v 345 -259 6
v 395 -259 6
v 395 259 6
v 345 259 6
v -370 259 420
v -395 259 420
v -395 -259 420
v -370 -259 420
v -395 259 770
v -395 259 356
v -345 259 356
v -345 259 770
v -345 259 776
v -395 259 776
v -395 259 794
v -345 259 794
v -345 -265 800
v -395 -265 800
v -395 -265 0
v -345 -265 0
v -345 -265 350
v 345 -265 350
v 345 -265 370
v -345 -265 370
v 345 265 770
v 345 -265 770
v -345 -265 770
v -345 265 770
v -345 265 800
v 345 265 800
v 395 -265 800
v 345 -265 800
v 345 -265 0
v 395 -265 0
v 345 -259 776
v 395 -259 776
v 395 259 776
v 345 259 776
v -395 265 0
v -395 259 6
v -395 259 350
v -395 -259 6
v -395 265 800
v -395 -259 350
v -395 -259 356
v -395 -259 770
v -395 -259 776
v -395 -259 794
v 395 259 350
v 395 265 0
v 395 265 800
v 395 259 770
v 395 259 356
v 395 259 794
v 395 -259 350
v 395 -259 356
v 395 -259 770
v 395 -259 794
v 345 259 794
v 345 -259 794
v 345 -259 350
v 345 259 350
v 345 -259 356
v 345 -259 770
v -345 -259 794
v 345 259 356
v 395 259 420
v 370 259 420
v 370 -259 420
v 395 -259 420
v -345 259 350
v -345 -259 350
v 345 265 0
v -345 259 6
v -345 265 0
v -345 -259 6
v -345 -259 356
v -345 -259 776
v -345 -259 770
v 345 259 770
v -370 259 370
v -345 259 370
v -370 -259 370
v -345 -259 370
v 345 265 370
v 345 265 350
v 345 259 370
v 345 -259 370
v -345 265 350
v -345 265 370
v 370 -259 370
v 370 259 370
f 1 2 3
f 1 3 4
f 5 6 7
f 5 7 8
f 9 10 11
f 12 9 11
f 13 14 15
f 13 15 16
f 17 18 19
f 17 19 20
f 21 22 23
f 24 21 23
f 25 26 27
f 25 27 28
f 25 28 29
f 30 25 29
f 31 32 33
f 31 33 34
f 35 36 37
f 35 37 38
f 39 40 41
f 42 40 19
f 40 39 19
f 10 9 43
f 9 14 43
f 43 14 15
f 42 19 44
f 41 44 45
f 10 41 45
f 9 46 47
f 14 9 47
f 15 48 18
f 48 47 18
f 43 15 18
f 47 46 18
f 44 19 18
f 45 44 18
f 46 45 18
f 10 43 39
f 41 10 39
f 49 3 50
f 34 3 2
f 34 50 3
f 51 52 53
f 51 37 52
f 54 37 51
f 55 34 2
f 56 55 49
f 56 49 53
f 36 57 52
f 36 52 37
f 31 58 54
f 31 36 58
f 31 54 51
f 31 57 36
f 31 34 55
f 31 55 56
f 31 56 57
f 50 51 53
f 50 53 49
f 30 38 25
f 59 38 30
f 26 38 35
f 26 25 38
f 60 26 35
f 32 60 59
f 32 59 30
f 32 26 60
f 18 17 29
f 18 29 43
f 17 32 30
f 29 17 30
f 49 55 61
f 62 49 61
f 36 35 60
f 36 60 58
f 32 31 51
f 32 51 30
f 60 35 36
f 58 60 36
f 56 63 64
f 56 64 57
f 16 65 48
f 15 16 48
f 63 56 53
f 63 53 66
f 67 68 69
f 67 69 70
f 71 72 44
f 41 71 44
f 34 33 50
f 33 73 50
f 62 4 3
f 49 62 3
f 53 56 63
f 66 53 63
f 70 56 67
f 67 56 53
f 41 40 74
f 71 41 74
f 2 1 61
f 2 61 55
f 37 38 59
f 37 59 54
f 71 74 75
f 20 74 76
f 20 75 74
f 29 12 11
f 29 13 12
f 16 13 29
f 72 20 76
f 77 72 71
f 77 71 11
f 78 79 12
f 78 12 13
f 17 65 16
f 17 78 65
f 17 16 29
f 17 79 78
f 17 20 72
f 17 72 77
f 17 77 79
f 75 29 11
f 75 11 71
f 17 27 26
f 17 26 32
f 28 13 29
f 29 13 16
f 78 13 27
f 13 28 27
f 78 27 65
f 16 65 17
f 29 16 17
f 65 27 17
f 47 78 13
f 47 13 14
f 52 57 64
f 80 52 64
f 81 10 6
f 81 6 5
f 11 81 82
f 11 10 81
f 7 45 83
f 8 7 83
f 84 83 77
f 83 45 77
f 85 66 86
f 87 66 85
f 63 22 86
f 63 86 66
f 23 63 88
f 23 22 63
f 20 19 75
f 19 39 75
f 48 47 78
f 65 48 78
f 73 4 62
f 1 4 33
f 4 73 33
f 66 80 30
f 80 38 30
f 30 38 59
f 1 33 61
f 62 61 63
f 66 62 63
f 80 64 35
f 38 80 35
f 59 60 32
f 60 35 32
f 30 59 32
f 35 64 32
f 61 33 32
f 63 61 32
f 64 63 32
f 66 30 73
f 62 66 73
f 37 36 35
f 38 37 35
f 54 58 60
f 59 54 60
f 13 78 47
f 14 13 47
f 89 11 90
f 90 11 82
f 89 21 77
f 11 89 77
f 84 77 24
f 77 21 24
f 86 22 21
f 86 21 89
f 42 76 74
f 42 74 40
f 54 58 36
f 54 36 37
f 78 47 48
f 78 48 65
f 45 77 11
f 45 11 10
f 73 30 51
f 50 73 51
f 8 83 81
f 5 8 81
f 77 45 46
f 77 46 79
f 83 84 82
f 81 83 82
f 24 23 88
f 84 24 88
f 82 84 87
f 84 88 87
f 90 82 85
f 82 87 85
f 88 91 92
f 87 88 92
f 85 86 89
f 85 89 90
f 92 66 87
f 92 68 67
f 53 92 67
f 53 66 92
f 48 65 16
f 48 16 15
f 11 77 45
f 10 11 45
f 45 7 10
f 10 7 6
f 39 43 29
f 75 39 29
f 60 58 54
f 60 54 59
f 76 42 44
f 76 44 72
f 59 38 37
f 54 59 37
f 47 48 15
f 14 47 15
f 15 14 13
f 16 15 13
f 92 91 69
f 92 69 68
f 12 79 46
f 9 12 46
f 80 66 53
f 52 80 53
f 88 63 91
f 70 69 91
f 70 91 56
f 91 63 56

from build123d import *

# Parameters (mm, degrees)
F2_W           = 50
F2_H           = 6
F3_DEPTH       = 800
F4_W           = 50
F4_H           = 6
F5_DEPTH       = 518
F10_W          = 530
F10_H          = 30
F11_DEPTH      = 395
F11_DEPTH_BACK = 395
F10_H_2        = 20
F14_W          = 25
F14_H          = 530
F15_DEPTH      = 50


with BuildPart() as f3:
    # F2 (on Top) → F3 (new body)
    with BuildSketch(Plane.XY):
        with Locations((-370, -262)):
            Rectangle(F2_W, F2_H)
    extrude(amount=F3_DEPTH)



with BuildPart() as f3b:
    # F2 (on Top) → F3, piece 2 (new body)
    with BuildSketch(Plane.XY):
        with Locations((-370, 262)):
            Rectangle(F2_W, F2_H)
    extrude(amount=F3_DEPTH)


with BuildPart() as f3c:
    # F2 (on Top) → F3, piece 3 (new body)
    with BuildSketch(Plane.XY):
        with Locations((370, -262)):
            Rectangle(F2_W, F2_H)
    extrude(amount=F3_DEPTH)



with BuildPart() as f3d:
    # F2 (on Top) → F3, piece 4 (new body)
    with BuildSketch(Plane.XY):
        with Locations((370, 262)):
            Rectangle(F2_W, F2_H)
    extrude(amount=F3_DEPTH)


with BuildPart() as f3c_1:
    add(f3c.part)

    add(f3d.part)  # F5 merges F3d
    # F4 (on face) → F5 (join, through all)
    with BuildSketch(Plane(origin=(0, -259, 0), x_dir=(-1, 0, 0), z_dir=(0, 1, 0))):
        with Locations((-370, 797)):
            Rectangle(F4_W, F4_H)
        with Locations((-370, 773)):
            Rectangle(F4_W, F4_H)
        with Locations((-370, 3)):
            Rectangle(F4_W, F4_H)
        with Locations((-370, 353)):
            Rectangle(F4_W, F4_H)
    extrude(amount=F5_DEPTH)

    # F6: union 

    # F8: union 


with BuildPart() as f3_1:
    add(f3.part)

    add(f3b.part)  # F5#2 merges F3b
    # F4 (on face) → F5, piece 2 (join, through all)
    with BuildSketch(Plane(origin=(0, -259, 0), x_dir=(-1, 0, 0), z_dir=(0, 1, 0))):
        with Locations((370, 773)):
            Rectangle(F4_W, F4_H)
        with Locations((370, 797)):
            Rectangle(F4_W, F4_H)
        with Locations((370, 3)):
            Rectangle(F4_W, F4_H)
        with Locations((370, 353)):
            Rectangle(F4_W, F4_H)
    extrude(amount=F5_DEPTH)

    # F7: union 

    # F9: union 


with BuildPart() as f11:
    # F10 (on Right) → F11 (new body, two sides)
    with BuildSketch(Plane.YZ) as f11_sk:
        with Locations((0, 785)):
            Rectangle(F10_W, F10_H)
    extrude(amount=F11_DEPTH)
    extrude(f11_sk.sketch, amount=-F11_DEPTH_BACK)

    # F13: cut F3, F3c
    add(f3_1.part, mode=Mode.SUBTRACT)
    add(f3c_1.part, mode=Mode.SUBTRACT)


with BuildPart() as f11b:
    # F10 (on Right) → F11, piece 2 (new body, two sides)
    with BuildSketch(Plane.YZ) as f11_2_sk:
        with Locations((0, 360)):
            Rectangle(F10_W, F10_H_2)
    extrude(amount=F11_DEPTH)
    extrude(f11_2_sk.sketch, amount=-F11_DEPTH_BACK)

    # F12: cut F3, F3c
    add(f3_1.part, mode=Mode.SUBTRACT)
    add(f3c_1.part, mode=Mode.SUBTRACT)

    # F14 (on face) → F15 (join)
    with BuildSketch(Plane.XY.offset(370)):
        with Locations((382.5, 0)):
            Rectangle(F14_W, F14_H)
        with Locations((-382.5, 0)):
            Rectangle(F14_W, F14_H)
    extrude(amount=F15_DEPTH)

    # F16: cut F3c, F3
    add(f3c_1.part, mode=Mode.SUBTRACT)
    add(f3_1.part, mode=Mode.SUBTRACT)


solid = Compound([f3c_1.part, f3_1.part, f11.part, f11b.part])
